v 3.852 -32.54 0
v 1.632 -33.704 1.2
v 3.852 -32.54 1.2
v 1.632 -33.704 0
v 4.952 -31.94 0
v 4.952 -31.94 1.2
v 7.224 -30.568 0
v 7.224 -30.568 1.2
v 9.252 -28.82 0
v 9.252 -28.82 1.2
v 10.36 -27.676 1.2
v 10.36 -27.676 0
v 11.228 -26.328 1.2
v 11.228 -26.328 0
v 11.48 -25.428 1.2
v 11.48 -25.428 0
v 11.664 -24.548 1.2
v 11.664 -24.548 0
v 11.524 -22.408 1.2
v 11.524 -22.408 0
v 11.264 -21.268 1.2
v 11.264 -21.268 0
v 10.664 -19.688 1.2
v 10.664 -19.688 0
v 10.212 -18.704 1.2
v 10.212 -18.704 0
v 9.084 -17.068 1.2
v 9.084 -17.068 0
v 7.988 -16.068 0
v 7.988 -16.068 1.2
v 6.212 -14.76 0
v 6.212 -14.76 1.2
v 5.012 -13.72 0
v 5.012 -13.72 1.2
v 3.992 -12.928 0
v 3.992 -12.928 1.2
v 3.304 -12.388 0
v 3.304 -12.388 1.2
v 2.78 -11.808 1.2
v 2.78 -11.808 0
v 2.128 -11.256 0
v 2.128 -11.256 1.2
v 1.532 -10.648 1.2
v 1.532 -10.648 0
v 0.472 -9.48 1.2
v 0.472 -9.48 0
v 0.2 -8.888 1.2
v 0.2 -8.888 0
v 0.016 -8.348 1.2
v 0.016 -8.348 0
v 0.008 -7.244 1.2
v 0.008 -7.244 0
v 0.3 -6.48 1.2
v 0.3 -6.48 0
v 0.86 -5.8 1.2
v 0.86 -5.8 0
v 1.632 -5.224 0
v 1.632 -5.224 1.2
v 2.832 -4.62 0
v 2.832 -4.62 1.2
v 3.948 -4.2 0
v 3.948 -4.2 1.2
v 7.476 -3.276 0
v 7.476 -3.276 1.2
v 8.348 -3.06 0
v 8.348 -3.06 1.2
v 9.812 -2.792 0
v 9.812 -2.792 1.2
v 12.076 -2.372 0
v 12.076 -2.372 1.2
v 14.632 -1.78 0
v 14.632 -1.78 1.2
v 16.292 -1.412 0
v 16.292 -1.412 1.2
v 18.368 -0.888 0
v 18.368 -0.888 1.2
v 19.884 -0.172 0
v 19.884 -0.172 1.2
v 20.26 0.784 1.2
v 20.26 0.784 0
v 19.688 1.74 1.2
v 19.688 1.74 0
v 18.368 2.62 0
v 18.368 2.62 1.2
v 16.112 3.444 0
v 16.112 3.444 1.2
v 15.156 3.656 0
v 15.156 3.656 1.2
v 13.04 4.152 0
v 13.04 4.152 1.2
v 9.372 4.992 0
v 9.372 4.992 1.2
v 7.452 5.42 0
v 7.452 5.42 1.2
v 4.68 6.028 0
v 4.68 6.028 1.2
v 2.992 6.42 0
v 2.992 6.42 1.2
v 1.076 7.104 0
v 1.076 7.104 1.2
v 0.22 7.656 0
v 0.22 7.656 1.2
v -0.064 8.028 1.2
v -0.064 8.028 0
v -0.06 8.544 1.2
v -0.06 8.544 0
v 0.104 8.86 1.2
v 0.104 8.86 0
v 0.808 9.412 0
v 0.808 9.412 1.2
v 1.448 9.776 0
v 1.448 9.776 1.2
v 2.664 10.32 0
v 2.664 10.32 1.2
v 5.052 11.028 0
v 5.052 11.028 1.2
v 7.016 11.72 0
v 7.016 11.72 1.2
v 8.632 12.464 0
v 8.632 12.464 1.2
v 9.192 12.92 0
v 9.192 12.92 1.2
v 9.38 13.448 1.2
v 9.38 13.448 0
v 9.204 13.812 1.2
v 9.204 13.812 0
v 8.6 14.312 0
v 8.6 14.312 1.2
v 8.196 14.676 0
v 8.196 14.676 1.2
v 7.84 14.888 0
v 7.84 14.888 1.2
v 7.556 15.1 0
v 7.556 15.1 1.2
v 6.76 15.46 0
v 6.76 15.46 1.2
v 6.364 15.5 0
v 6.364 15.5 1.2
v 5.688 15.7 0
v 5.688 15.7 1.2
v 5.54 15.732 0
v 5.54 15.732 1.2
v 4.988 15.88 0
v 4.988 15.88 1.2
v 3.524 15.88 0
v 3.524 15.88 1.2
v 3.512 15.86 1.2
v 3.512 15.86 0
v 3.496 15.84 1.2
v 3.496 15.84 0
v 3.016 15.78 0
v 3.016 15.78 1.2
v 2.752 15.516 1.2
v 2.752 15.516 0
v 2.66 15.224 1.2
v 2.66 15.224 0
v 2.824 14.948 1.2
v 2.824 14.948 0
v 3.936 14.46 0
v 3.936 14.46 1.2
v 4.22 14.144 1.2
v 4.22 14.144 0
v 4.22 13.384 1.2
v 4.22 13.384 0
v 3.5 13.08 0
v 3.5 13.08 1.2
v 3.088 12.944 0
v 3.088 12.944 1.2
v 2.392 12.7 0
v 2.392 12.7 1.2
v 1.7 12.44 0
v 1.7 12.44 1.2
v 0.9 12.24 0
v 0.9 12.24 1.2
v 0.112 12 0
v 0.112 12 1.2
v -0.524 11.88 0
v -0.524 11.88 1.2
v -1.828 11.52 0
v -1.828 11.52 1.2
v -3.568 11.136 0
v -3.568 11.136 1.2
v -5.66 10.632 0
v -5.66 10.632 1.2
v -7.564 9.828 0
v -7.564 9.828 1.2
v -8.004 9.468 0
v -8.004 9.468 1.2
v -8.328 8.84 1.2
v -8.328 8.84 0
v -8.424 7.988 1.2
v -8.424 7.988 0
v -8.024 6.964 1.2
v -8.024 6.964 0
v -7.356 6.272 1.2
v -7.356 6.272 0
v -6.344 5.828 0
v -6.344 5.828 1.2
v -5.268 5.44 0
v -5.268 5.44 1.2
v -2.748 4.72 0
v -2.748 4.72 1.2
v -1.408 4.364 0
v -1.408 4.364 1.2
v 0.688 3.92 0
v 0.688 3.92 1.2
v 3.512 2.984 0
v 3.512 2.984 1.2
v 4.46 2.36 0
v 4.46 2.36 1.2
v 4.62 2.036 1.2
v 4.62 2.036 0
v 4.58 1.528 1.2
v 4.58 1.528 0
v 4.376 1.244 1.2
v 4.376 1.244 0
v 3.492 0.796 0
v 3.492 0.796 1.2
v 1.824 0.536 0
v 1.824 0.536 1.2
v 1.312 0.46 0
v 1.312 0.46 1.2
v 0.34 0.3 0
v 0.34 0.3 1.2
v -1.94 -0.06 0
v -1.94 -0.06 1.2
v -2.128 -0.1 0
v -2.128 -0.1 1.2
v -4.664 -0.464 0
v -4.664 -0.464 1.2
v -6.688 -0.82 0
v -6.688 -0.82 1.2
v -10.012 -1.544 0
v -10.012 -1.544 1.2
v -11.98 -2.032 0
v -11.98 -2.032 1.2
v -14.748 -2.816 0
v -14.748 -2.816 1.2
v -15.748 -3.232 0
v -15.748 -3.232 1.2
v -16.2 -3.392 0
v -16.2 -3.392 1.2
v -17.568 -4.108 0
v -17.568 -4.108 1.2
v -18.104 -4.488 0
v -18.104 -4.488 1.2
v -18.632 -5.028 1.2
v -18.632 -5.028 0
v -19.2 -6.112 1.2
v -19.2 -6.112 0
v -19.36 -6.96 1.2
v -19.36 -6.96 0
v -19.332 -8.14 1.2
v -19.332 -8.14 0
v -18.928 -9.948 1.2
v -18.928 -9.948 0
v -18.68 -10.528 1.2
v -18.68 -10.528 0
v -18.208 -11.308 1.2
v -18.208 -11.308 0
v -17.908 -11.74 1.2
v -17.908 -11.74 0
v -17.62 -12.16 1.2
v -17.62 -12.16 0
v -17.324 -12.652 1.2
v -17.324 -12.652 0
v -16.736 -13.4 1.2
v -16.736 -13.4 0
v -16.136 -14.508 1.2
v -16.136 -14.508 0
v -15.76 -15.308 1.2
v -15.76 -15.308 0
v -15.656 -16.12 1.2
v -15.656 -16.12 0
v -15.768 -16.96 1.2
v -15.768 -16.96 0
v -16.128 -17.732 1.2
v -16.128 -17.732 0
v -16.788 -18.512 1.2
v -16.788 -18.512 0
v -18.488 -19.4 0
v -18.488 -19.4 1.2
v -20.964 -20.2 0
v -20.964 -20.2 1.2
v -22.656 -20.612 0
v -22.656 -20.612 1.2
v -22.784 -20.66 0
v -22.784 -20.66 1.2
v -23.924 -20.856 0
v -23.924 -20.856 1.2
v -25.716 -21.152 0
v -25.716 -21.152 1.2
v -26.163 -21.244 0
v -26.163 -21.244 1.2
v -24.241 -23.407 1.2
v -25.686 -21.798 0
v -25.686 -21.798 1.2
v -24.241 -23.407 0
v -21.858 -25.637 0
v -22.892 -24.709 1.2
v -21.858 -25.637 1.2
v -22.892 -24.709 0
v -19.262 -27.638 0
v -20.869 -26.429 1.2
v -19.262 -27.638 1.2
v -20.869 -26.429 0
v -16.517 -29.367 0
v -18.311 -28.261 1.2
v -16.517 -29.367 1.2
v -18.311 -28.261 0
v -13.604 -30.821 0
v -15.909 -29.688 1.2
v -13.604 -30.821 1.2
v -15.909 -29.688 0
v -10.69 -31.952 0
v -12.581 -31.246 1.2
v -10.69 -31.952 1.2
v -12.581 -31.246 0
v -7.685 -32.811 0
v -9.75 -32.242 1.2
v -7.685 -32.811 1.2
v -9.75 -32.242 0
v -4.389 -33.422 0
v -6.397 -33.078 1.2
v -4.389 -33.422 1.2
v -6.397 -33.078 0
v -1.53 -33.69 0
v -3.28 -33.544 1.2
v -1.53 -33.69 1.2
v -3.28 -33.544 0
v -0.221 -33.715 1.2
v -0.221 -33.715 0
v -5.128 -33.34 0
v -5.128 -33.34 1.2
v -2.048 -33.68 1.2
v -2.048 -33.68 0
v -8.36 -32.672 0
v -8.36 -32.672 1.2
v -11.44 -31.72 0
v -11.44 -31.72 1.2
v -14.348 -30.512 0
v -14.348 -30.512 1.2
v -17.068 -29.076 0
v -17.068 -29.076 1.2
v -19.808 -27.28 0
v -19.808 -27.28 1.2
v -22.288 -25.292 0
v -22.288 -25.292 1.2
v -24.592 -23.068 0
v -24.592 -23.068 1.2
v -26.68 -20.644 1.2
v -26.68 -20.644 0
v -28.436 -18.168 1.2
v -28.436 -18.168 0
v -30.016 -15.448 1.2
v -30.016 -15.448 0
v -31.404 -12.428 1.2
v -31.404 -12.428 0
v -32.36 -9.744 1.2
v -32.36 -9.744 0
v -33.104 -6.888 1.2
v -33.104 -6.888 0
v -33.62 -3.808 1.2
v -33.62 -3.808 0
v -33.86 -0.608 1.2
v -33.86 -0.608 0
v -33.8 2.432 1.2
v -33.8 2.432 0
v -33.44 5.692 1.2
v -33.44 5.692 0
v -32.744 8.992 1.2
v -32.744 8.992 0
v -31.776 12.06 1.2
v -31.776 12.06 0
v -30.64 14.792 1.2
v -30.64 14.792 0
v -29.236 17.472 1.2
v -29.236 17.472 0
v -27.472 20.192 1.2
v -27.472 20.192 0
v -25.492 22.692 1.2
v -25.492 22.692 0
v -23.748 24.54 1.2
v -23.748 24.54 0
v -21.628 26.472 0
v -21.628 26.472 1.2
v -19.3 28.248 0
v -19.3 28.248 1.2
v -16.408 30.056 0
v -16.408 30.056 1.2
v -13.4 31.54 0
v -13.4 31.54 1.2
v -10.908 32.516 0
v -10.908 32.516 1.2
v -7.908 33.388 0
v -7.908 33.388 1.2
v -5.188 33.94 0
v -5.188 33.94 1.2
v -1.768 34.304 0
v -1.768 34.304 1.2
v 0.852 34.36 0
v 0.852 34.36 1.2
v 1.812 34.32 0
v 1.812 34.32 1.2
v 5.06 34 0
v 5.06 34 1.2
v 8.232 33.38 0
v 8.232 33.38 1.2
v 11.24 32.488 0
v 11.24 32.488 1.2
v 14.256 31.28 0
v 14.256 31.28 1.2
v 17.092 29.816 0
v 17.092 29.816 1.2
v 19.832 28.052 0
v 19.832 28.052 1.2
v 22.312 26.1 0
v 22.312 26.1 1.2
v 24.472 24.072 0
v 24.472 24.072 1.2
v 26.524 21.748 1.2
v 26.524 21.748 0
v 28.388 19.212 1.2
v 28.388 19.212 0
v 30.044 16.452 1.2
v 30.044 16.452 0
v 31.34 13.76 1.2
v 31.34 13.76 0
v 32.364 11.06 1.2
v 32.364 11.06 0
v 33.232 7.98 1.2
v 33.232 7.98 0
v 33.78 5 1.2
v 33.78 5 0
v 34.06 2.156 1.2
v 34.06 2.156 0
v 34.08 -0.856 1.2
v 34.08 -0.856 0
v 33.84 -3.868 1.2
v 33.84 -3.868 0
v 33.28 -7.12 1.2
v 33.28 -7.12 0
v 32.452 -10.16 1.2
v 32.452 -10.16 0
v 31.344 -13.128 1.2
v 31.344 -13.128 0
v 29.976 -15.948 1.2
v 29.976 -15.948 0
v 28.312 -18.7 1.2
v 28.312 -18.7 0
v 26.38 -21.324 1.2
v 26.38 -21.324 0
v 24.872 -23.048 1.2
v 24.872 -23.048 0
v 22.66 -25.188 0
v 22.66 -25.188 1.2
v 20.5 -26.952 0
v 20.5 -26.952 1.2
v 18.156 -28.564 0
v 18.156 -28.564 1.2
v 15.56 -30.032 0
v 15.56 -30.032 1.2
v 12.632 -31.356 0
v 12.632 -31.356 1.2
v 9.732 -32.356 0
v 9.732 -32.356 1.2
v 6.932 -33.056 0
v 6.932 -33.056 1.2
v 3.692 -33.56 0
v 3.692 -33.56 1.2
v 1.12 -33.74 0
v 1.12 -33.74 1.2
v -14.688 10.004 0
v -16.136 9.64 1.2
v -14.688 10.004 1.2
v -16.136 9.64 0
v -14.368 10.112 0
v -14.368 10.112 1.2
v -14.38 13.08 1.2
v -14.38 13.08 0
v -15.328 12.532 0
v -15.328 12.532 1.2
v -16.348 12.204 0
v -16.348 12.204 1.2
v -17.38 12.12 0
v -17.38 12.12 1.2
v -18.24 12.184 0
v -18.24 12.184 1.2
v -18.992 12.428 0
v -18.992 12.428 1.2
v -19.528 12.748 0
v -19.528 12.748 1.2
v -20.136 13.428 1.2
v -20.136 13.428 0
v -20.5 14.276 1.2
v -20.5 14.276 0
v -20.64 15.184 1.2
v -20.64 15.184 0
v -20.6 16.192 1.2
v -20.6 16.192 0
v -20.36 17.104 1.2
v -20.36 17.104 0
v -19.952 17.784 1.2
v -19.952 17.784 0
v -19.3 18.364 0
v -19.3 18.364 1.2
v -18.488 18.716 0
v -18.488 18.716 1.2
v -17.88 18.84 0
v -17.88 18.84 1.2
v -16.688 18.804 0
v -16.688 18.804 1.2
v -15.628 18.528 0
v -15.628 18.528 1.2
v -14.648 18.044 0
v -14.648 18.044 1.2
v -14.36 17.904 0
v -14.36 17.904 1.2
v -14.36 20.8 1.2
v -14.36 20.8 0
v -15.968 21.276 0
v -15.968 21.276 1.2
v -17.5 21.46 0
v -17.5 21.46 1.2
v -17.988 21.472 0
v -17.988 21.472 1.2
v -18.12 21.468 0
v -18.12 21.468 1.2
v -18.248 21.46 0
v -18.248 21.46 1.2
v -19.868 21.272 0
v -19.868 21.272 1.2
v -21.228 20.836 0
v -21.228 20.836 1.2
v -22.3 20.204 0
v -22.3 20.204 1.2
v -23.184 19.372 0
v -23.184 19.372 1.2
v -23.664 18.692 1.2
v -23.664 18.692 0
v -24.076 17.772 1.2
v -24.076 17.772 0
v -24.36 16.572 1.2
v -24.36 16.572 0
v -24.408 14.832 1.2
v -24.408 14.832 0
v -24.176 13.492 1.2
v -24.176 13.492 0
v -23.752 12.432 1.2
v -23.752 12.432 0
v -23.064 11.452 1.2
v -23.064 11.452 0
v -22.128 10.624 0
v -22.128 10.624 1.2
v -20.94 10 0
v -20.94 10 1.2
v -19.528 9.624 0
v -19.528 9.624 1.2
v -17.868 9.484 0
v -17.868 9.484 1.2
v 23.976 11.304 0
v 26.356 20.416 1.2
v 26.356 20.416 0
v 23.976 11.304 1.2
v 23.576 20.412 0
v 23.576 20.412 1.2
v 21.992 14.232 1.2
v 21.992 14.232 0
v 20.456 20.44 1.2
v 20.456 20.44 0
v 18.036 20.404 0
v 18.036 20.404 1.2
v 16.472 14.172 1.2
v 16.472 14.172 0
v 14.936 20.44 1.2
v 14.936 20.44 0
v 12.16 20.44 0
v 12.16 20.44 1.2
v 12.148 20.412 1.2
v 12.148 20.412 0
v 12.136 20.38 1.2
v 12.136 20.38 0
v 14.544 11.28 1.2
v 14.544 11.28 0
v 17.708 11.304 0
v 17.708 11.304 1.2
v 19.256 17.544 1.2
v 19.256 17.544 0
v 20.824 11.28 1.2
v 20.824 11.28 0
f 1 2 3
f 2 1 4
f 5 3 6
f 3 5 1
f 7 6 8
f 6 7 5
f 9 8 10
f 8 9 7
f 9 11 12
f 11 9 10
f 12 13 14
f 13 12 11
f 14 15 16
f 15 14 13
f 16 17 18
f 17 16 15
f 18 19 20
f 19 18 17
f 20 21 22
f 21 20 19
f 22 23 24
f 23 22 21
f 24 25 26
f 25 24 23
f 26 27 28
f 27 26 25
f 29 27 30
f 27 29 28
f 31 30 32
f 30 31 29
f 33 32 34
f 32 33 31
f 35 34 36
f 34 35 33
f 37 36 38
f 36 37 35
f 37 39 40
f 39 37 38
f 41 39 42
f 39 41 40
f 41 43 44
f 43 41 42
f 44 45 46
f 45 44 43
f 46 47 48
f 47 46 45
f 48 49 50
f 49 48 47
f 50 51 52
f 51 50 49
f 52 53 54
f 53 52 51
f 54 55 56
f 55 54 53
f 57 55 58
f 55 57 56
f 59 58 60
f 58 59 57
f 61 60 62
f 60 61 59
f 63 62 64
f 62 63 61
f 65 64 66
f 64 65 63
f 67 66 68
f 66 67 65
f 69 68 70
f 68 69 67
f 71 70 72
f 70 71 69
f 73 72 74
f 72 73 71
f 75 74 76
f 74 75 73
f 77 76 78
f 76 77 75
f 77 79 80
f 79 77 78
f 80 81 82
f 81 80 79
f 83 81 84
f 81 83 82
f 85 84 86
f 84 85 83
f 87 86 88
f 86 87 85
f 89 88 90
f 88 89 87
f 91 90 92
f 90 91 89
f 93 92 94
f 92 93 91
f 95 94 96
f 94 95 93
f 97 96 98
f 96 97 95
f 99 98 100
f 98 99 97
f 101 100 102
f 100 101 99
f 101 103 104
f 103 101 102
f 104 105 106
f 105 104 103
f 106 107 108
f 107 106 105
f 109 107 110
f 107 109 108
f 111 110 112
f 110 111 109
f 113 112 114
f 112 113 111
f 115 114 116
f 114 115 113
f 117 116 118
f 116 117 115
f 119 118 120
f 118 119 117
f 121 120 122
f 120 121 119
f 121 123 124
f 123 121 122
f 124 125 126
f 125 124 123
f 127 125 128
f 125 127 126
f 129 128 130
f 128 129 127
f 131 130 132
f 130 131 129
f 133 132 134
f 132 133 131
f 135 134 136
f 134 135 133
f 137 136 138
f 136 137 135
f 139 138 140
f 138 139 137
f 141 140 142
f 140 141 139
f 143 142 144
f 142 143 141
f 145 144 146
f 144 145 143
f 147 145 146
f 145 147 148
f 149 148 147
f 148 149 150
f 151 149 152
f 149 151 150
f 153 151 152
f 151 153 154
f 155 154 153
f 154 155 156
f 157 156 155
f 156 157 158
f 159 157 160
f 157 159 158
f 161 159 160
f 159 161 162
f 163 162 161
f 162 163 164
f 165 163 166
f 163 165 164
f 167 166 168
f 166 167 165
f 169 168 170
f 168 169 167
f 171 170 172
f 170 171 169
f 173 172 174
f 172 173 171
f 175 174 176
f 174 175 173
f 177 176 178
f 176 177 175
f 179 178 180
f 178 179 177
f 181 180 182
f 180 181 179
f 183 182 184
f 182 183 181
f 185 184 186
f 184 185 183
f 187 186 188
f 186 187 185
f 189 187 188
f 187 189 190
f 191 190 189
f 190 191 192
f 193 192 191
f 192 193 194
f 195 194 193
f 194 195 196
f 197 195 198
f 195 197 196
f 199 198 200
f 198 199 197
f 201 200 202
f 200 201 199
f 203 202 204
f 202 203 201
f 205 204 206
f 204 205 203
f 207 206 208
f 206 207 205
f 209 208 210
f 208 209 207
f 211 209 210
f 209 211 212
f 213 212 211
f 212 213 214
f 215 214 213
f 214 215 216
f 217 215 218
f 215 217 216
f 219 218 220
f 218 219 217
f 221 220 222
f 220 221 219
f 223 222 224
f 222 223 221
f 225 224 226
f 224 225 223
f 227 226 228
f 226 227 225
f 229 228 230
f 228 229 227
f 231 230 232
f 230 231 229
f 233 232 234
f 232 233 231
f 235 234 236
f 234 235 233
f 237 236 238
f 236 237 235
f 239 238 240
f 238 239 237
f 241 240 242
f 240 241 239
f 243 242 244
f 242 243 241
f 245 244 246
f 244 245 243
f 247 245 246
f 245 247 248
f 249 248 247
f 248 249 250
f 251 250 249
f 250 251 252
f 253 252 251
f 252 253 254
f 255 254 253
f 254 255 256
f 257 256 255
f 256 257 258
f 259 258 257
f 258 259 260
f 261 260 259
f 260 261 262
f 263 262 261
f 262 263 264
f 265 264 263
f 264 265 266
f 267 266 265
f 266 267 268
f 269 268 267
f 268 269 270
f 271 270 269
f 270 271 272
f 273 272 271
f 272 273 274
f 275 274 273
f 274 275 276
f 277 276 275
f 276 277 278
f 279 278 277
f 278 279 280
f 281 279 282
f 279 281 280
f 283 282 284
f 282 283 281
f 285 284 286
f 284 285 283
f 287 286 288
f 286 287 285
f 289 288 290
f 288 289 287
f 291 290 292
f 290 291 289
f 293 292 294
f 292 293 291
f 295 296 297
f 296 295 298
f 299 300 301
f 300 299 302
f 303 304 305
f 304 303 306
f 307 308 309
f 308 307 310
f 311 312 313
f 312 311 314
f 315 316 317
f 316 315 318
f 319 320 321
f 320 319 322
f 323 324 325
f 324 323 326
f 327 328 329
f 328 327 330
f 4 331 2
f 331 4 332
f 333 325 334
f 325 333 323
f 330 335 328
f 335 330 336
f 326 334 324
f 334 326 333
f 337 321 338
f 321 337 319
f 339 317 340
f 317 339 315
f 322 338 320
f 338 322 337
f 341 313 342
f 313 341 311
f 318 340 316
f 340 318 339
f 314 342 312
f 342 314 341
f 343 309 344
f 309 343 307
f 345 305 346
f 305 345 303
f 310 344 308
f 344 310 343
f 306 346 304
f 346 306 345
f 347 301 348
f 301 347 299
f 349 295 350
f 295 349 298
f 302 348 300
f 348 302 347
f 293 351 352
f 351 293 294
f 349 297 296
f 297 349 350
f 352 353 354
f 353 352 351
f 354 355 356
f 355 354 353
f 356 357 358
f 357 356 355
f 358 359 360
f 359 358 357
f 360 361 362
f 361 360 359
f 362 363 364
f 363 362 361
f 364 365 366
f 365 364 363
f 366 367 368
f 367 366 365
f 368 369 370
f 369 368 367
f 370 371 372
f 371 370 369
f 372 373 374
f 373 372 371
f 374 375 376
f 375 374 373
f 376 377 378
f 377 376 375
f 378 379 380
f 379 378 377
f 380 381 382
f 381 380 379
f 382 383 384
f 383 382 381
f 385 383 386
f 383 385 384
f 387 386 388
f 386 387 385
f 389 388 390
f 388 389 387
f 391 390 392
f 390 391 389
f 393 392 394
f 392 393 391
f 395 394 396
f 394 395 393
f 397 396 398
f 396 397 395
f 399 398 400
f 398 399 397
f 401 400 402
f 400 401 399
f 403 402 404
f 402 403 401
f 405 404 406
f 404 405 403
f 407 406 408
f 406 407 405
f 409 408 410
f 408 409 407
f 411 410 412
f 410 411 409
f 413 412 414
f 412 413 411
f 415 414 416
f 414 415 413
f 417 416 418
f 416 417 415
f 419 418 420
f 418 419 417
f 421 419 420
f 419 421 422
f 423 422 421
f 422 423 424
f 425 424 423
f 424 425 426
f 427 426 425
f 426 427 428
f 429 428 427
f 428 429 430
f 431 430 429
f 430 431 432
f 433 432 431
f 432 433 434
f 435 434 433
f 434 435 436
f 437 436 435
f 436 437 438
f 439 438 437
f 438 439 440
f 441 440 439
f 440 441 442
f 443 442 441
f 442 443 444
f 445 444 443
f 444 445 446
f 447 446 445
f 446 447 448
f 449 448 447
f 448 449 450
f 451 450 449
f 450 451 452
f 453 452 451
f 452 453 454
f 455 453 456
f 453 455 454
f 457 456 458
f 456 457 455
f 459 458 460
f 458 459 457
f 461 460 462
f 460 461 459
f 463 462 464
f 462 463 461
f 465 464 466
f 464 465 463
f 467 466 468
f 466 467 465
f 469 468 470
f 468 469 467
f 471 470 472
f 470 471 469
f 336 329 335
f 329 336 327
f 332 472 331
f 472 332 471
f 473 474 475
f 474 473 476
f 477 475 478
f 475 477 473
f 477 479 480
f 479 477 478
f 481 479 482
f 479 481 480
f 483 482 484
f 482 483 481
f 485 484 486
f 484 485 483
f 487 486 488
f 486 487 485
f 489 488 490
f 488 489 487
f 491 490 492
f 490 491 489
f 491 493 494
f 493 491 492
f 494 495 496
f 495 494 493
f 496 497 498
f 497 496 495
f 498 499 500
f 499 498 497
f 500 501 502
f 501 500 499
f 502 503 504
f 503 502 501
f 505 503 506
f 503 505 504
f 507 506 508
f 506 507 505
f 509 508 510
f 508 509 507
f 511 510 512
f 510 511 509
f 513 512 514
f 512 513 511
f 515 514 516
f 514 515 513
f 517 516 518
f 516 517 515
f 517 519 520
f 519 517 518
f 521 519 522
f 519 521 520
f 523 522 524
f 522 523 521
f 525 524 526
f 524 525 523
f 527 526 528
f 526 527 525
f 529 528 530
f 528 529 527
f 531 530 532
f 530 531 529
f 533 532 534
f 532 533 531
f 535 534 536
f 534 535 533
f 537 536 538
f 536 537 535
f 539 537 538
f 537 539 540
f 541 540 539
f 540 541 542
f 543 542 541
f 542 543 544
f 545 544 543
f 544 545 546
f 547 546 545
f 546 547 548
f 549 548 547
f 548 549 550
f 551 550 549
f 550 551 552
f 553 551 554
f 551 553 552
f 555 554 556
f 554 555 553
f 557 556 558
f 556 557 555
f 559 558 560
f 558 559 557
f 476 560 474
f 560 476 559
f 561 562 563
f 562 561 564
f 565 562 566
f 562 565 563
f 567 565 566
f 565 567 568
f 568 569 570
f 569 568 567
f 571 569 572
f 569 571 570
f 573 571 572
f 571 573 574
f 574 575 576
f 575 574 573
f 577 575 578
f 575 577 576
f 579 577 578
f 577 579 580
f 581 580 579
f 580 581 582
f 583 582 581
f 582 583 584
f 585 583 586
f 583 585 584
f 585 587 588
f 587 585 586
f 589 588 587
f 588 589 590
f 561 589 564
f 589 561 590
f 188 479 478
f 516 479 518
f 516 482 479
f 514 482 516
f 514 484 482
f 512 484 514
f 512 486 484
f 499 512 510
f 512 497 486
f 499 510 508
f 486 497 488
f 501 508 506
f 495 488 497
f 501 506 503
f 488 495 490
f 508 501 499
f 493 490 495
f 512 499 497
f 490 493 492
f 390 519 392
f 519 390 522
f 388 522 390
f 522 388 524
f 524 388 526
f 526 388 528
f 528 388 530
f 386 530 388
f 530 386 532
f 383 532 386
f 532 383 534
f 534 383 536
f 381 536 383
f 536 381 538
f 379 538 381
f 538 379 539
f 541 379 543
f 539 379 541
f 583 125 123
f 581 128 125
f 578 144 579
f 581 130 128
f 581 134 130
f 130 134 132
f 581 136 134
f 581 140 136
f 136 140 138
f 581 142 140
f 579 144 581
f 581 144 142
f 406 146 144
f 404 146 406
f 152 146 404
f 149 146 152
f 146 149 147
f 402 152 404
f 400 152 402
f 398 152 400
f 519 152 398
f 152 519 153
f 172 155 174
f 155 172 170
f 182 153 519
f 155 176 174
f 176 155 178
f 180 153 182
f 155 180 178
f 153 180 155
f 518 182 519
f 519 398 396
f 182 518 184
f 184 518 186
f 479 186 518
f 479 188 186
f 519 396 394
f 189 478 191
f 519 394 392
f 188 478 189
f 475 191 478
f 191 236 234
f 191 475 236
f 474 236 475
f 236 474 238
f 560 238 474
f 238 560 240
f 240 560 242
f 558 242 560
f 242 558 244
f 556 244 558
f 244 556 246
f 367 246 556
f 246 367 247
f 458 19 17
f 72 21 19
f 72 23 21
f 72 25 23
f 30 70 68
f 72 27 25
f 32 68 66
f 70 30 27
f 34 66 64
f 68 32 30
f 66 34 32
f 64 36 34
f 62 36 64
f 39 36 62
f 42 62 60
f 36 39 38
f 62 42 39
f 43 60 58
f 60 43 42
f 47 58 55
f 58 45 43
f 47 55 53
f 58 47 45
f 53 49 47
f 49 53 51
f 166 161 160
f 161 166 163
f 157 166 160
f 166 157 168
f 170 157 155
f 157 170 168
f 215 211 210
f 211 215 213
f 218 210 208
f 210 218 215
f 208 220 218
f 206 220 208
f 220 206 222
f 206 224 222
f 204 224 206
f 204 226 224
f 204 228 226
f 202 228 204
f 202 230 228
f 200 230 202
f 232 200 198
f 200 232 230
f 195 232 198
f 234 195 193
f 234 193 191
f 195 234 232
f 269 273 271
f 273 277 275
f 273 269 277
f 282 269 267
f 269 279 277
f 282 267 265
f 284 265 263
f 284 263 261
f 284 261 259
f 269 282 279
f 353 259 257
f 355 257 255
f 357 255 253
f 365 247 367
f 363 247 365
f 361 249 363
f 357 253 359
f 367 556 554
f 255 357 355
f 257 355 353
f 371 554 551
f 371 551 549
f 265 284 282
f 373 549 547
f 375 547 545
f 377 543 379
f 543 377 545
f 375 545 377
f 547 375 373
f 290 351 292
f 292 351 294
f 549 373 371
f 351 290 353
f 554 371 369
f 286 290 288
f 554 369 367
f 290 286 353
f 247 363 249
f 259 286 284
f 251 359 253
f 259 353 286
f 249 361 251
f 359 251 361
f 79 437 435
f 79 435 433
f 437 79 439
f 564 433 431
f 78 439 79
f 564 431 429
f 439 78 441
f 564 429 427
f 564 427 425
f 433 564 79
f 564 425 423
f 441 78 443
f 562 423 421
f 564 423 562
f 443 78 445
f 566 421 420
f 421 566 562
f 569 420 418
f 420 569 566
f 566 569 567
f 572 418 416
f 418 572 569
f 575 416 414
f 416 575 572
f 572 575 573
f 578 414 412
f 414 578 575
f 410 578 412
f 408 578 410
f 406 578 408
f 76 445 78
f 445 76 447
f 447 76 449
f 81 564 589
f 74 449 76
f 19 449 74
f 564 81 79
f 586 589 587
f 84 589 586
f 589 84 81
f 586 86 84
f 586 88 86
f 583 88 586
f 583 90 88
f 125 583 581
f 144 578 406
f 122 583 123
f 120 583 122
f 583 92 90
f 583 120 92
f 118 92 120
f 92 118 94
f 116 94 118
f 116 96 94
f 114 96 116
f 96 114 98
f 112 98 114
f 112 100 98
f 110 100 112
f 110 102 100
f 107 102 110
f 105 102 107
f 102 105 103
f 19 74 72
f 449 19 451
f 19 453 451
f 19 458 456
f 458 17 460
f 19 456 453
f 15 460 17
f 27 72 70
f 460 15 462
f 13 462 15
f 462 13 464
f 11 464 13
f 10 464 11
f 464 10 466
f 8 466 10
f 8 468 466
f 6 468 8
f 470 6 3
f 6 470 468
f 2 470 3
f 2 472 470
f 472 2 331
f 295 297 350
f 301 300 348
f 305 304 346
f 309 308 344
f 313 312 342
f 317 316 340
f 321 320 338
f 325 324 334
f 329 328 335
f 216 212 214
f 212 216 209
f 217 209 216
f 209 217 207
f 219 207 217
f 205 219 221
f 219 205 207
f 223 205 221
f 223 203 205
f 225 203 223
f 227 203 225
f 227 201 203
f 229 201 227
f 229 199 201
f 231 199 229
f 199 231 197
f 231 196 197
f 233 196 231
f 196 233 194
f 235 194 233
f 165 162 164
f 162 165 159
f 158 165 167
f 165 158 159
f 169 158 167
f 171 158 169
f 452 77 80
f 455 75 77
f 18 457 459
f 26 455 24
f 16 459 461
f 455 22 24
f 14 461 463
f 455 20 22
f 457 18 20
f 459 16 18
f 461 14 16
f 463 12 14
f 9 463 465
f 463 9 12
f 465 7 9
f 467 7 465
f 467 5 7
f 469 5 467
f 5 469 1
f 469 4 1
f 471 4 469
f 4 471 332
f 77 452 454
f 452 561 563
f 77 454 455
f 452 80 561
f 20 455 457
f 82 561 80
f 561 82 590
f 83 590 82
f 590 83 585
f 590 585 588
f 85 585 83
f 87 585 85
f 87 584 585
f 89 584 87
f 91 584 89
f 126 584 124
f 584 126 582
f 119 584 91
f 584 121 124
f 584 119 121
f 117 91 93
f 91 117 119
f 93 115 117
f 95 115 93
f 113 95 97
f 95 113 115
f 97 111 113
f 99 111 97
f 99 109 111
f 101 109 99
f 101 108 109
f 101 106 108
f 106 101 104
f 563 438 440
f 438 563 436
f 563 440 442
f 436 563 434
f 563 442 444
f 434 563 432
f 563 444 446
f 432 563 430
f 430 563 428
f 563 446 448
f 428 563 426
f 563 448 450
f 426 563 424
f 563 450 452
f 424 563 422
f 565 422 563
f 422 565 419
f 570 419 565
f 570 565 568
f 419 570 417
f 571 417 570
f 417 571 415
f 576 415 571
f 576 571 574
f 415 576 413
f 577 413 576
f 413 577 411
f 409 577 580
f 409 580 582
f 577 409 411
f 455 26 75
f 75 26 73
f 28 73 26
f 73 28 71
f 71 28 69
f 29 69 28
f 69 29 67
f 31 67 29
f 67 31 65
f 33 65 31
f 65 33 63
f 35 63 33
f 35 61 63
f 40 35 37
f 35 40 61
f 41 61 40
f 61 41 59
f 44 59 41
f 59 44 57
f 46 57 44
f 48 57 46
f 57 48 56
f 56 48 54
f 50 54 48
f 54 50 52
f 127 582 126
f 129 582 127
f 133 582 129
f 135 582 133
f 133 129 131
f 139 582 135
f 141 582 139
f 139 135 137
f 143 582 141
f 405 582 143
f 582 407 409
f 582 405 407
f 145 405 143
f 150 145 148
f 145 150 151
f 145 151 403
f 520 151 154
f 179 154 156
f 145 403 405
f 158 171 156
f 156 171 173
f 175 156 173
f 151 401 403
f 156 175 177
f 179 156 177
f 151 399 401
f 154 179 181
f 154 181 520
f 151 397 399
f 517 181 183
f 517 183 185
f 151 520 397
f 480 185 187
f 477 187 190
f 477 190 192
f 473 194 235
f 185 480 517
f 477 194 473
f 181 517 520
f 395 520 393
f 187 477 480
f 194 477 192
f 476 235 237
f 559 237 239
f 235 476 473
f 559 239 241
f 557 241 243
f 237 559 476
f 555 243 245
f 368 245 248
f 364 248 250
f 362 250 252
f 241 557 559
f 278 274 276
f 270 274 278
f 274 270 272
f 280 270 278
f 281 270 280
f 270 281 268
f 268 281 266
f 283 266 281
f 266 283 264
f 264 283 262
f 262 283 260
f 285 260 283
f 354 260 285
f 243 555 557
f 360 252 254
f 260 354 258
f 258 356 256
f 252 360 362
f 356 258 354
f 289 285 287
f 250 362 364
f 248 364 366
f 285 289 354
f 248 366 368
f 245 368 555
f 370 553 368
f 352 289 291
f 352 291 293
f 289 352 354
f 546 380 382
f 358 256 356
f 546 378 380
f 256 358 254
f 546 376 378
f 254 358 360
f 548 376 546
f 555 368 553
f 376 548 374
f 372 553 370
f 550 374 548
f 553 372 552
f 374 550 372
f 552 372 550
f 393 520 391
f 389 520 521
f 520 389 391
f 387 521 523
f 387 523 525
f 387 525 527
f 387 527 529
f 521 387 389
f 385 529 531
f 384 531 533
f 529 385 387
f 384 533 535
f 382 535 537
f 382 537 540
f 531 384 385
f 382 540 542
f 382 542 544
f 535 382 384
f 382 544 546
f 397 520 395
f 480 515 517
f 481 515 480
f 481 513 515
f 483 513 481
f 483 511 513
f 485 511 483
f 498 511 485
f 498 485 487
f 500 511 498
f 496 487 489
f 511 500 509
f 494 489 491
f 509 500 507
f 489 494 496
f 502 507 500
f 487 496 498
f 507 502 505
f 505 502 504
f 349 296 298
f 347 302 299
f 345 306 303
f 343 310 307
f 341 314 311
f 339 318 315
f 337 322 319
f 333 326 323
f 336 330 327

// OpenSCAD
// file: C2white2.scad
module C2white2_1()
{
 /* Generated by trace2scad version 20150415
    http://aggregate.org/MAKE/TRACE2SCAD/
    Optimized model has 276/2770 original points
 */
 color([0.5, 0.5, 0.5])
 assign(minx=0) /* polygon minx=0 */
 assign(miny=0) /* polygon miny=0 */
 assign(maxx=20000) /* polygon maxx=20000 */
 assign(maxy=19690) /* polygon maxy=19690 */
 assign(dx=maxx-minx)
 assign(dy=maxy-miny)
 assign(maxd=((dx>dy)?dx:dy))
 scale([1/maxd, 1/maxd, 1])
 translate([-minx-dx/2, -miny-dy/2, 0])
 linear_extrude(height=1, convexity=276)
 union() {
  union() {
   polygon([[1,18799],[3,17908],[221,17839],[472,17805],[701,17833],[908,17890],[1153,18025],[1430,18292],[1584,18588],[1629,18742],[1660,18993],[1623,19271],[1575,19428],[1438,19676],[1425,19690],[0,19690]], convexity=5);
   polygon([[18275,19684],[18275,19678],[18190,19480],[18139,19274],[18133,19174],[18133,19061],[18165,18838],[18210,18684],[18345,18443],[18390,18373],[18617,18160],[18878,18016],[19060,17965],[19152,17947],[19364,17930],[19474,17948],[19726,18011],[20000,18151],[20000,19690],[18275,19690]], convexity=7);
   union() {
    difference() {
     polygon([[9773,19182],[9718,19180],[8873,19120],[7988,18976],[7175,18765],[6498,18531],[5833,18244],[5096,17850],[4363,17369],[3699,16841],[3097,16268],[2607,15718],[2098,15036],[1666,14338],[1281,13563],[979,12783],[740,11942],[589,11128],[510,10283],[504,9644],[560,8823],[704,7938],[915,7135],[1174,6408],[1514,5663],[1945,4913],[2375,4295],[2908,3651],[3556,3003],[4169,2493],[4825,2033],[5523,1629],[6286,1270],[7128,965],[7968,745],[8790,607],[9468,546],[9981,529],[10883,575],[11771,700],[12613,899],[13443,1176],[14106,1460],[14877,1872],[15563,2320],[16203,2822],[16744,3324],[17328,3964],[17799,4583],[18245,5288],[18623,6023],[18921,6753],[19154,7498],[19328,8298],[19430,9088],[19466,9859],[19420,10743],[19299,11583],[19115,12358],[18863,13123],[18575,13801],[18159,14578],[17698,15275],[17248,15848],[16943,16192],[16371,16747],[15728,17275],[15083,17719],[14408,18105],[13608,18475],[12805,18760],[11998,18971],[11133,19115],[10288,19180],[9828,19184]], convexity=6);
     polygon([[10333,18430],[10453,18425],[11265,18345],[12058,18190],[12810,17967],[13564,17665],[14273,17299],[14958,16858],[15578,16370],[16118,15863],[16631,15282],[17097,14648],[17511,13958],[17835,13285],[18091,12610],[18308,11840],[18445,11095],[18515,10384],[18520,9631],[18460,8878],[18320,8065],[18113,7305],[17836,6563],[17494,5858],[17078,5170],[16595,4514],[16218,4083],[15665,3548],[15125,3107],[14539,2704],[13890,2337],[13158,2006],[12433,1756],[11733,1581],[10923,1455],[10280,1410],[9488,1425],[8718,1510],[7910,1677],[7140,1915],[6413,2217],[5733,2576],[5048,3025],[4428,3522],[3852,4078],[3330,4684],[2891,5303],[2496,5983],[2149,6738],[1910,7409],[1724,8123],[1595,8893],[1535,9693],[1550,10453],[1640,11268],[1814,12093],[2056,12860],[2340,13543],[2691,14213],[3132,14893],[3627,15518],[4063,15980],[4593,16463],[5175,16907],[5898,17359],[6650,17730],[7273,17974],[8023,18192],[8703,18330],[9558,18421],[10213,18435]], convexity=6);
    }
    polygon([[5470,15212],[5438,15210],[5033,15163],[4693,15054],[4425,14896],[4204,14688],[4084,14518],[3981,14288],[3910,13988],[3898,13553],[3956,13218],[4062,12953],[4234,12708],[4468,12501],[4765,12345],[5118,12251],[5533,12216],[5966,12255],[6328,12346],[6408,12373],[6405,13115],[6168,12978],[5913,12896],[5655,12875],[5440,12891],[5252,12952],[5118,13032],[4966,13202],[4875,13414],[4840,13641],[4850,13893],[4910,14121],[5012,14291],[5175,14436],[5378,14524],[5530,14555],[5828,14546],[6093,14477],[6338,14356],[6410,14321],[6410,15045],[6008,15164],[5625,15210],[5503,15213]], convexity=12);
    polygon([[13037,14948],[13034,14940],[13636,12665],[14427,12671],[14814,14231],[15206,12665],[15994,12671],[16589,14949],[15894,14948],[15498,13403],[15114,14955],[14509,14946],[14118,13388],[13734,14955],[13040,14955]], convexity=11);
   }
   polygon([[19317,1895],[19313,1891],[19054,1852],[18793,1743],[18637,1640],[18420,1407],[18319,1238],[18230,1004],[18192,716],[18215,488],[18257,332],[18390,63],[18428,3],[20000,0],[20000,1719],[19773,1825],[19567,1880],[19322,1900]], convexity=6);
   polygon([[417,1770],[413,1766],[194,1738],[3,1672],[0,0],[1498,0],[1595,225],[1629,342],[1650,479],[1655,643],[1623,863],[1544,1085],[1415,1303],[1173,1545],[875,1700],[665,1755],[422,1775]], convexity=5);
  }
 }
}

module C2white2()
{
 /* all layers combined, scaled to within a 1mm cube */
 scale([1, 1, 1/1])
 difference() {
  union() {
   scale([1,1,2]) translate([0,0,-0.5]) C2white2_1();
  }
  translate([0,0,-2]) cube([2,2,4],center=true);
 }
}
C2white2();
// file: C2purple2.scad
module C2purple2_1()
{
 /* Generated by trace2scad version 20150415
    http://aggregate.org/MAKE/TRACE2SCAD/
    Optimized model has 227/2747 original points
 */
 color([0.5, 0.5, 0.5])
 assign(minx=0) /* polygon minx=0 */
 assign(miny=0) /* polygon miny=0 */
 assign(maxx=20000) /* polygon maxx=20000 */
 assign(maxy=19690) /* polygon maxy=19690 */
 assign(dx=maxx-minx)
 assign(dy=maxy-miny)
 assign(maxd=((dx>dy)?dx:dy))
 scale([1/maxd, 1/maxd, 1])
 translate([-minx-dx/2, -miny-dy/2, 0])
 linear_extrude(height=1, convexity=227)
 union() {
  union() {
   polygon([[1,18799],[3,17908],[221,17839],[472,17805],[701,17833],[908,17890],[1153,18025],[1430,18292],[1584,18588],[1629,18742],[1660,18993],[1623,19271],[1575,19428],[1438,19676],[1425,19690],[0,19690]], convexity=5);
   polygon([[18275,19684],[18275,19678],[18190,19480],[18139,19274],[18133,19174],[18133,19061],[18165,18838],[18210,18684],[18345,18443],[18390,18373],[18617,18160],[18878,18016],[19060,17965],[19152,17947],[19364,17930],[19474,17948],[19726,18011],[20000,18151],[20000,19690],[18275,19690]], convexity=7);
   polygon([[10878,13810],[10874,13805],[10754,13790],[10688,13724],[10665,13651],[10706,13582],[10984,13460],[11055,13381],[11055,13191],[10875,13115],[10772,13081],[10598,13020],[10425,12955],[10225,12905],[10028,12845],[9869,12815],[9543,12725],[9108,12629],[8585,12503],[8109,12302],[7999,12212],[7918,12055],[7894,11842],[7994,11586],[8161,11413],[8414,11302],[8683,11205],[9313,11025],[9648,10936],[10172,10825],[10878,10591],[11115,10435],[11155,10354],[11145,10227],[11094,10156],[10873,10044],[10456,9979],[10328,9960],[10085,9920],[9515,9830],[9468,9820],[8834,9729],[8328,9640],[7497,9459],[7005,9337],[6313,9141],[6063,9037],[5950,8997],[5608,8818],[5474,8723],[5342,8588],[5200,8317],[5160,8105],[5167,7810],[5268,7358],[5330,7213],[5448,7018],[5523,6910],[5595,6805],[5669,6682],[5816,6495],[5966,6218],[6060,6018],[6086,5815],[6058,5605],[5968,5412],[5803,5217],[5378,4995],[4759,4795],[4336,4692],[4304,4680],[4019,4631],[3571,4557],[3455,4533],[4046,3875],[4620,3360],[5253,2884],[5915,2476],[6690,2095],[7408,1827],[8188,1612],[8988,1475],[9708,1415],[10408,1419],[10963,1710],[11238,1860],[11806,2203],[12313,2640],[12590,2926],[12807,3263],[12870,3488],[12916,3708],[12881,4243],[12816,4528],[12666,4923],[12553,5169],[12271,5578],[11997,5828],[11553,6155],[11253,6415],[10998,6613],[10826,6748],[10695,6893],[10532,7031],[10383,7183],[10118,7475],[10050,7623],[10004,7758],[10002,8034],[10075,8225],[10215,8395],[10408,8539],[10708,8690],[10987,8795],[11869,9026],[12087,9080],[12453,9147],[13019,9252],[13658,9400],[14073,9492],[14592,9623],[14971,9802],[15065,10041],[14922,10280],[14592,10500],[14028,10706],[13789,10759],[13260,10883],[12343,11093],[11863,11200],[11170,11352],[10748,11450],[10269,11621],[10055,11759],[9984,11852],[9985,11981],[10026,12060],[10202,12198],[10362,12289],[10666,12425],[11263,12602],[11754,12775],[12158,12961],[12298,13075],[12345,13207],[12301,13298],[12150,13423],[12049,13514],[11960,13567],[11889,13620],[11690,13710],[11591,13720],[11422,13770],[11385,13778],[11247,13815],[10881,13815]], convexity=16);
   polygon([[19317,1895],[19313,1891],[19054,1852],[18793,1743],[18637,1640],[18420,1407],[18319,1238],[18230,1004],[18192,716],[18215,488],[18257,332],[18390,63],[18428,3],[20000,0],[20000,1719],[19773,1825],[19567,1880],[19322,1900]], convexity=6);
   polygon([[417,1770],[413,1766],[194,1738],[3,1672],[0,0],[1498,0],[1595,225],[1629,342],[1650,479],[1655,643],[1623,863],[1544,1085],[1415,1303],[1173,1545],[875,1700],[665,1755],[422,1775]], convexity=5);
  }
 }
}

module C2purple2()
{
 /* all layers combined, scaled to within a 1mm cube */
 scale([1, 1, 1/1])
 difference() {
  union() {
   scale([1,1,2]) translate([0,0,-0.5]) C2purple2_1();
  }
  translate([0,0,-2]) cube([2,2,4],center=true);
 }
}
C2purple2();
// file: C1purple.scad
module C1purple_1()
{
 /* Generated by trace2scad version 20150415
    http://aggregate.org/MAKE/TRACE2SCAD/
    Optimized model has 251/3093 original points
 */
 color([0.5, 0.5, 0.5])
 assign(minx=0) /* polygon minx=0 */
 assign(miny=0) /* polygon miny=0 */
 assign(maxx=20000) /* polygon maxx=20000 */
 assign(maxy=19690) /* polygon maxy=19690 */
 assign(dx=maxx-minx)
 assign(dy=maxy-miny)
 assign(maxd=((dx>dy)?dx:dy))
 scale([1/maxd, 1/maxd, 1])
 translate([-minx-dx/2, -miny-dy/2, 0])
 linear_extrude(height=1, convexity=251)
 union() {
  union() {
   polygon([[1,18799],[3,17908],[221,17839],[472,17805],[701,17833],[908,17890],[1153,18025],[1430,18292],[1584,18588],[1629,18742],[1660,18993],[1623,19271],[1575,19428],[1438,19676],[1425,19690],[0,19690]], convexity=5);
   polygon([[18275,19684],[18275,19678],[18190,19480],[18139,19274],[18133,19174],[18133,19061],[18165,18838],[18210,18684],[18345,18443],[18390,18373],[18617,18160],[18878,18016],[19060,17965],[19152,17947],[19364,17930],[19474,17948],[19726,18011],[20000,18151],[20000,19690],[18275,19690]], convexity=7);
   polygon([[10765,13695],[10758,13690],[10770,13642],[11014,13508],[11223,13408],[11315,13303],[11331,13201],[11276,13098],[11170,13020],[10593,12893],[9863,12785],[9569,12731],[9108,12629],[8585,12503],[8109,12302],[7999,12212],[7918,12055],[7894,11842],[7994,11586],[8161,11413],[8414,11302],[8683,11205],[9313,11025],[9648,10936],[10172,10825],[10878,10591],[11115,10435],[11155,10354],[11145,10227],[11094,10156],[10873,10044],[10456,9979],[10328,9960],[10085,9920],[9515,9830],[9468,9820],[8834,9729],[8328,9640],[7497,9459],[7005,9337],[6313,9141],[6063,9037],[5950,8997],[5608,8818],[5474,8723],[5342,8588],[5200,8317],[5160,8105],[5167,7810],[5268,7358],[5330,7213],[5448,7018],[5523,6910],[5595,6805],[5669,6682],[5816,6495],[5966,6218],[6060,6018],[6086,5815],[6058,5605],[5968,5412],[5803,5217],[5378,4995],[4759,4795],[4336,4692],[4304,4680],[4019,4631],[3568,4557],[3241,4511],[2794,4451],[2793,4385],[2975,4178],[3332,3780],[3496,3612],[3839,3275],[3948,3170],[4118,3048],[4416,2780],[4593,2650],[4691,2585],[4833,2466],[4895,2429],[4965,2360],[5054,2318],[5365,2150],[5489,2087],[5583,2025],[5963,1835],[6171,1731],[6280,1683],[6458,1585],[6511,1565],[6783,1479],[7023,1389],[7137,1365],[7336,1305],[7410,1284],[7471,1250],[7619,1219],[7717,1190],[7844,1157],[8163,1095],[8333,1060],[8430,1033],[8522,1010],[8785,980],[9003,955],[9123,927],[9229,915],[9320,923],[9470,1030],[10055,1260],[10178,1305],[10963,1710],[11238,1860],[11806,2203],[12313,2640],[12590,2926],[12807,3263],[12870,3488],[12916,3708],[12881,4243],[12816,4528],[12666,4923],[12553,5169],[12271,5578],[11997,5828],[11553,6155],[11253,6415],[10998,6613],[10826,6748],[10695,6893],[10532,7031],[10383,7183],[10118,7475],[10050,7623],[10004,7758],[10002,8034],[10075,8225],[10215,8395],[10408,8539],[10708,8690],[10987,8795],[11869,9026],[12087,9080],[12453,9147],[13019,9252],[13658,9400],[14073,9492],[14592,9623],[14971,9802],[15065,10041],[14922,10280],[14592,10500],[14028,10706],[13789,10759],[13260,10883],[12343,11093],[11863,11200],[11170,11352],[10748,11450],[10269,11621],[10055,11759],[9984,11852],[9985,11981],[10026,12060],[10202,12198],[10362,12289],[10666,12425],[11263,12602],[11754,12775],[12158,12961],[12298,13075],[12343,13212],[12318,13278],[12135,13415],[11753,13540],[11189,13663],[11060,13680],[10773,13700]], convexity=16);
   polygon([[19317,1895],[19313,1891],[19054,1852],[18793,1743],[18637,1640],[18420,1407],[18319,1238],[18230,1004],[18192,716],[18215,488],[18257,332],[18390,63],[18428,3],[20000,0],[20000,1719],[19773,1825],[19567,1880],[19322,1900]], convexity=6);
   polygon([[417,1770],[413,1766],[194,1738],[3,1672],[0,0],[1498,0],[1595,225],[1629,342],[1650,479],[1655,643],[1623,863],[1544,1085],[1415,1303],[1173,1545],[875,1700],[665,1755],[422,1775]], convexity=5);
  }
 }
}

module C1purple()
{
 /* all layers combined, scaled to within a 1mm cube */
 scale([1, 1, 1/1])
 difference() {
  union() {
   scale([1,1,2]) translate([0,0,-0.5]) C1purple_1();
  }
  translate([0,0,-2]) cube([2,2,4],center=true);
 }
}
C1purple();
// main file
// CrickWooder.scad
//
//------------------------------------------------


use <./C1purple.scad>
use <./C2purple2.scad>
use <./C1white1.scad>
use <./C2white2.scad>

//=====================================================

if(0){
intersection(){
  cylinder(r=37.5,h=1.2,$fn=300);

  scale([80,80,1.2]){
    
    //color("white")
    //C1white1();
    //C2white2();
    //color("purple")
    //C1purple();
    C2purple2();

    }
  }
}

// get black by subtraction so no voids between parts
if(1){
  color("black")
difference(){
  cylinder(r=37,h=1.2,$fn=300);

  translate([0,0,-1])
  scale([80,80,4]){
  
//  C1purple();
  C2purple2();
  //C1white1();
  C2white2();
  
  }
  
}
}

// clear disk bottom
if(0){
  color("cyan",alpha=0.4)
  translate([0,0,-0.3])  
  cylinder(r=37.5,h=0.3,$fn=300);
}

// clear top bottom
if(0){
  color("cyan",alpha=0.4)
  translate([0,0,1.2])  
  cylinder(r=37.5,h=0.3,$fn=300);
}


//=====================================================
